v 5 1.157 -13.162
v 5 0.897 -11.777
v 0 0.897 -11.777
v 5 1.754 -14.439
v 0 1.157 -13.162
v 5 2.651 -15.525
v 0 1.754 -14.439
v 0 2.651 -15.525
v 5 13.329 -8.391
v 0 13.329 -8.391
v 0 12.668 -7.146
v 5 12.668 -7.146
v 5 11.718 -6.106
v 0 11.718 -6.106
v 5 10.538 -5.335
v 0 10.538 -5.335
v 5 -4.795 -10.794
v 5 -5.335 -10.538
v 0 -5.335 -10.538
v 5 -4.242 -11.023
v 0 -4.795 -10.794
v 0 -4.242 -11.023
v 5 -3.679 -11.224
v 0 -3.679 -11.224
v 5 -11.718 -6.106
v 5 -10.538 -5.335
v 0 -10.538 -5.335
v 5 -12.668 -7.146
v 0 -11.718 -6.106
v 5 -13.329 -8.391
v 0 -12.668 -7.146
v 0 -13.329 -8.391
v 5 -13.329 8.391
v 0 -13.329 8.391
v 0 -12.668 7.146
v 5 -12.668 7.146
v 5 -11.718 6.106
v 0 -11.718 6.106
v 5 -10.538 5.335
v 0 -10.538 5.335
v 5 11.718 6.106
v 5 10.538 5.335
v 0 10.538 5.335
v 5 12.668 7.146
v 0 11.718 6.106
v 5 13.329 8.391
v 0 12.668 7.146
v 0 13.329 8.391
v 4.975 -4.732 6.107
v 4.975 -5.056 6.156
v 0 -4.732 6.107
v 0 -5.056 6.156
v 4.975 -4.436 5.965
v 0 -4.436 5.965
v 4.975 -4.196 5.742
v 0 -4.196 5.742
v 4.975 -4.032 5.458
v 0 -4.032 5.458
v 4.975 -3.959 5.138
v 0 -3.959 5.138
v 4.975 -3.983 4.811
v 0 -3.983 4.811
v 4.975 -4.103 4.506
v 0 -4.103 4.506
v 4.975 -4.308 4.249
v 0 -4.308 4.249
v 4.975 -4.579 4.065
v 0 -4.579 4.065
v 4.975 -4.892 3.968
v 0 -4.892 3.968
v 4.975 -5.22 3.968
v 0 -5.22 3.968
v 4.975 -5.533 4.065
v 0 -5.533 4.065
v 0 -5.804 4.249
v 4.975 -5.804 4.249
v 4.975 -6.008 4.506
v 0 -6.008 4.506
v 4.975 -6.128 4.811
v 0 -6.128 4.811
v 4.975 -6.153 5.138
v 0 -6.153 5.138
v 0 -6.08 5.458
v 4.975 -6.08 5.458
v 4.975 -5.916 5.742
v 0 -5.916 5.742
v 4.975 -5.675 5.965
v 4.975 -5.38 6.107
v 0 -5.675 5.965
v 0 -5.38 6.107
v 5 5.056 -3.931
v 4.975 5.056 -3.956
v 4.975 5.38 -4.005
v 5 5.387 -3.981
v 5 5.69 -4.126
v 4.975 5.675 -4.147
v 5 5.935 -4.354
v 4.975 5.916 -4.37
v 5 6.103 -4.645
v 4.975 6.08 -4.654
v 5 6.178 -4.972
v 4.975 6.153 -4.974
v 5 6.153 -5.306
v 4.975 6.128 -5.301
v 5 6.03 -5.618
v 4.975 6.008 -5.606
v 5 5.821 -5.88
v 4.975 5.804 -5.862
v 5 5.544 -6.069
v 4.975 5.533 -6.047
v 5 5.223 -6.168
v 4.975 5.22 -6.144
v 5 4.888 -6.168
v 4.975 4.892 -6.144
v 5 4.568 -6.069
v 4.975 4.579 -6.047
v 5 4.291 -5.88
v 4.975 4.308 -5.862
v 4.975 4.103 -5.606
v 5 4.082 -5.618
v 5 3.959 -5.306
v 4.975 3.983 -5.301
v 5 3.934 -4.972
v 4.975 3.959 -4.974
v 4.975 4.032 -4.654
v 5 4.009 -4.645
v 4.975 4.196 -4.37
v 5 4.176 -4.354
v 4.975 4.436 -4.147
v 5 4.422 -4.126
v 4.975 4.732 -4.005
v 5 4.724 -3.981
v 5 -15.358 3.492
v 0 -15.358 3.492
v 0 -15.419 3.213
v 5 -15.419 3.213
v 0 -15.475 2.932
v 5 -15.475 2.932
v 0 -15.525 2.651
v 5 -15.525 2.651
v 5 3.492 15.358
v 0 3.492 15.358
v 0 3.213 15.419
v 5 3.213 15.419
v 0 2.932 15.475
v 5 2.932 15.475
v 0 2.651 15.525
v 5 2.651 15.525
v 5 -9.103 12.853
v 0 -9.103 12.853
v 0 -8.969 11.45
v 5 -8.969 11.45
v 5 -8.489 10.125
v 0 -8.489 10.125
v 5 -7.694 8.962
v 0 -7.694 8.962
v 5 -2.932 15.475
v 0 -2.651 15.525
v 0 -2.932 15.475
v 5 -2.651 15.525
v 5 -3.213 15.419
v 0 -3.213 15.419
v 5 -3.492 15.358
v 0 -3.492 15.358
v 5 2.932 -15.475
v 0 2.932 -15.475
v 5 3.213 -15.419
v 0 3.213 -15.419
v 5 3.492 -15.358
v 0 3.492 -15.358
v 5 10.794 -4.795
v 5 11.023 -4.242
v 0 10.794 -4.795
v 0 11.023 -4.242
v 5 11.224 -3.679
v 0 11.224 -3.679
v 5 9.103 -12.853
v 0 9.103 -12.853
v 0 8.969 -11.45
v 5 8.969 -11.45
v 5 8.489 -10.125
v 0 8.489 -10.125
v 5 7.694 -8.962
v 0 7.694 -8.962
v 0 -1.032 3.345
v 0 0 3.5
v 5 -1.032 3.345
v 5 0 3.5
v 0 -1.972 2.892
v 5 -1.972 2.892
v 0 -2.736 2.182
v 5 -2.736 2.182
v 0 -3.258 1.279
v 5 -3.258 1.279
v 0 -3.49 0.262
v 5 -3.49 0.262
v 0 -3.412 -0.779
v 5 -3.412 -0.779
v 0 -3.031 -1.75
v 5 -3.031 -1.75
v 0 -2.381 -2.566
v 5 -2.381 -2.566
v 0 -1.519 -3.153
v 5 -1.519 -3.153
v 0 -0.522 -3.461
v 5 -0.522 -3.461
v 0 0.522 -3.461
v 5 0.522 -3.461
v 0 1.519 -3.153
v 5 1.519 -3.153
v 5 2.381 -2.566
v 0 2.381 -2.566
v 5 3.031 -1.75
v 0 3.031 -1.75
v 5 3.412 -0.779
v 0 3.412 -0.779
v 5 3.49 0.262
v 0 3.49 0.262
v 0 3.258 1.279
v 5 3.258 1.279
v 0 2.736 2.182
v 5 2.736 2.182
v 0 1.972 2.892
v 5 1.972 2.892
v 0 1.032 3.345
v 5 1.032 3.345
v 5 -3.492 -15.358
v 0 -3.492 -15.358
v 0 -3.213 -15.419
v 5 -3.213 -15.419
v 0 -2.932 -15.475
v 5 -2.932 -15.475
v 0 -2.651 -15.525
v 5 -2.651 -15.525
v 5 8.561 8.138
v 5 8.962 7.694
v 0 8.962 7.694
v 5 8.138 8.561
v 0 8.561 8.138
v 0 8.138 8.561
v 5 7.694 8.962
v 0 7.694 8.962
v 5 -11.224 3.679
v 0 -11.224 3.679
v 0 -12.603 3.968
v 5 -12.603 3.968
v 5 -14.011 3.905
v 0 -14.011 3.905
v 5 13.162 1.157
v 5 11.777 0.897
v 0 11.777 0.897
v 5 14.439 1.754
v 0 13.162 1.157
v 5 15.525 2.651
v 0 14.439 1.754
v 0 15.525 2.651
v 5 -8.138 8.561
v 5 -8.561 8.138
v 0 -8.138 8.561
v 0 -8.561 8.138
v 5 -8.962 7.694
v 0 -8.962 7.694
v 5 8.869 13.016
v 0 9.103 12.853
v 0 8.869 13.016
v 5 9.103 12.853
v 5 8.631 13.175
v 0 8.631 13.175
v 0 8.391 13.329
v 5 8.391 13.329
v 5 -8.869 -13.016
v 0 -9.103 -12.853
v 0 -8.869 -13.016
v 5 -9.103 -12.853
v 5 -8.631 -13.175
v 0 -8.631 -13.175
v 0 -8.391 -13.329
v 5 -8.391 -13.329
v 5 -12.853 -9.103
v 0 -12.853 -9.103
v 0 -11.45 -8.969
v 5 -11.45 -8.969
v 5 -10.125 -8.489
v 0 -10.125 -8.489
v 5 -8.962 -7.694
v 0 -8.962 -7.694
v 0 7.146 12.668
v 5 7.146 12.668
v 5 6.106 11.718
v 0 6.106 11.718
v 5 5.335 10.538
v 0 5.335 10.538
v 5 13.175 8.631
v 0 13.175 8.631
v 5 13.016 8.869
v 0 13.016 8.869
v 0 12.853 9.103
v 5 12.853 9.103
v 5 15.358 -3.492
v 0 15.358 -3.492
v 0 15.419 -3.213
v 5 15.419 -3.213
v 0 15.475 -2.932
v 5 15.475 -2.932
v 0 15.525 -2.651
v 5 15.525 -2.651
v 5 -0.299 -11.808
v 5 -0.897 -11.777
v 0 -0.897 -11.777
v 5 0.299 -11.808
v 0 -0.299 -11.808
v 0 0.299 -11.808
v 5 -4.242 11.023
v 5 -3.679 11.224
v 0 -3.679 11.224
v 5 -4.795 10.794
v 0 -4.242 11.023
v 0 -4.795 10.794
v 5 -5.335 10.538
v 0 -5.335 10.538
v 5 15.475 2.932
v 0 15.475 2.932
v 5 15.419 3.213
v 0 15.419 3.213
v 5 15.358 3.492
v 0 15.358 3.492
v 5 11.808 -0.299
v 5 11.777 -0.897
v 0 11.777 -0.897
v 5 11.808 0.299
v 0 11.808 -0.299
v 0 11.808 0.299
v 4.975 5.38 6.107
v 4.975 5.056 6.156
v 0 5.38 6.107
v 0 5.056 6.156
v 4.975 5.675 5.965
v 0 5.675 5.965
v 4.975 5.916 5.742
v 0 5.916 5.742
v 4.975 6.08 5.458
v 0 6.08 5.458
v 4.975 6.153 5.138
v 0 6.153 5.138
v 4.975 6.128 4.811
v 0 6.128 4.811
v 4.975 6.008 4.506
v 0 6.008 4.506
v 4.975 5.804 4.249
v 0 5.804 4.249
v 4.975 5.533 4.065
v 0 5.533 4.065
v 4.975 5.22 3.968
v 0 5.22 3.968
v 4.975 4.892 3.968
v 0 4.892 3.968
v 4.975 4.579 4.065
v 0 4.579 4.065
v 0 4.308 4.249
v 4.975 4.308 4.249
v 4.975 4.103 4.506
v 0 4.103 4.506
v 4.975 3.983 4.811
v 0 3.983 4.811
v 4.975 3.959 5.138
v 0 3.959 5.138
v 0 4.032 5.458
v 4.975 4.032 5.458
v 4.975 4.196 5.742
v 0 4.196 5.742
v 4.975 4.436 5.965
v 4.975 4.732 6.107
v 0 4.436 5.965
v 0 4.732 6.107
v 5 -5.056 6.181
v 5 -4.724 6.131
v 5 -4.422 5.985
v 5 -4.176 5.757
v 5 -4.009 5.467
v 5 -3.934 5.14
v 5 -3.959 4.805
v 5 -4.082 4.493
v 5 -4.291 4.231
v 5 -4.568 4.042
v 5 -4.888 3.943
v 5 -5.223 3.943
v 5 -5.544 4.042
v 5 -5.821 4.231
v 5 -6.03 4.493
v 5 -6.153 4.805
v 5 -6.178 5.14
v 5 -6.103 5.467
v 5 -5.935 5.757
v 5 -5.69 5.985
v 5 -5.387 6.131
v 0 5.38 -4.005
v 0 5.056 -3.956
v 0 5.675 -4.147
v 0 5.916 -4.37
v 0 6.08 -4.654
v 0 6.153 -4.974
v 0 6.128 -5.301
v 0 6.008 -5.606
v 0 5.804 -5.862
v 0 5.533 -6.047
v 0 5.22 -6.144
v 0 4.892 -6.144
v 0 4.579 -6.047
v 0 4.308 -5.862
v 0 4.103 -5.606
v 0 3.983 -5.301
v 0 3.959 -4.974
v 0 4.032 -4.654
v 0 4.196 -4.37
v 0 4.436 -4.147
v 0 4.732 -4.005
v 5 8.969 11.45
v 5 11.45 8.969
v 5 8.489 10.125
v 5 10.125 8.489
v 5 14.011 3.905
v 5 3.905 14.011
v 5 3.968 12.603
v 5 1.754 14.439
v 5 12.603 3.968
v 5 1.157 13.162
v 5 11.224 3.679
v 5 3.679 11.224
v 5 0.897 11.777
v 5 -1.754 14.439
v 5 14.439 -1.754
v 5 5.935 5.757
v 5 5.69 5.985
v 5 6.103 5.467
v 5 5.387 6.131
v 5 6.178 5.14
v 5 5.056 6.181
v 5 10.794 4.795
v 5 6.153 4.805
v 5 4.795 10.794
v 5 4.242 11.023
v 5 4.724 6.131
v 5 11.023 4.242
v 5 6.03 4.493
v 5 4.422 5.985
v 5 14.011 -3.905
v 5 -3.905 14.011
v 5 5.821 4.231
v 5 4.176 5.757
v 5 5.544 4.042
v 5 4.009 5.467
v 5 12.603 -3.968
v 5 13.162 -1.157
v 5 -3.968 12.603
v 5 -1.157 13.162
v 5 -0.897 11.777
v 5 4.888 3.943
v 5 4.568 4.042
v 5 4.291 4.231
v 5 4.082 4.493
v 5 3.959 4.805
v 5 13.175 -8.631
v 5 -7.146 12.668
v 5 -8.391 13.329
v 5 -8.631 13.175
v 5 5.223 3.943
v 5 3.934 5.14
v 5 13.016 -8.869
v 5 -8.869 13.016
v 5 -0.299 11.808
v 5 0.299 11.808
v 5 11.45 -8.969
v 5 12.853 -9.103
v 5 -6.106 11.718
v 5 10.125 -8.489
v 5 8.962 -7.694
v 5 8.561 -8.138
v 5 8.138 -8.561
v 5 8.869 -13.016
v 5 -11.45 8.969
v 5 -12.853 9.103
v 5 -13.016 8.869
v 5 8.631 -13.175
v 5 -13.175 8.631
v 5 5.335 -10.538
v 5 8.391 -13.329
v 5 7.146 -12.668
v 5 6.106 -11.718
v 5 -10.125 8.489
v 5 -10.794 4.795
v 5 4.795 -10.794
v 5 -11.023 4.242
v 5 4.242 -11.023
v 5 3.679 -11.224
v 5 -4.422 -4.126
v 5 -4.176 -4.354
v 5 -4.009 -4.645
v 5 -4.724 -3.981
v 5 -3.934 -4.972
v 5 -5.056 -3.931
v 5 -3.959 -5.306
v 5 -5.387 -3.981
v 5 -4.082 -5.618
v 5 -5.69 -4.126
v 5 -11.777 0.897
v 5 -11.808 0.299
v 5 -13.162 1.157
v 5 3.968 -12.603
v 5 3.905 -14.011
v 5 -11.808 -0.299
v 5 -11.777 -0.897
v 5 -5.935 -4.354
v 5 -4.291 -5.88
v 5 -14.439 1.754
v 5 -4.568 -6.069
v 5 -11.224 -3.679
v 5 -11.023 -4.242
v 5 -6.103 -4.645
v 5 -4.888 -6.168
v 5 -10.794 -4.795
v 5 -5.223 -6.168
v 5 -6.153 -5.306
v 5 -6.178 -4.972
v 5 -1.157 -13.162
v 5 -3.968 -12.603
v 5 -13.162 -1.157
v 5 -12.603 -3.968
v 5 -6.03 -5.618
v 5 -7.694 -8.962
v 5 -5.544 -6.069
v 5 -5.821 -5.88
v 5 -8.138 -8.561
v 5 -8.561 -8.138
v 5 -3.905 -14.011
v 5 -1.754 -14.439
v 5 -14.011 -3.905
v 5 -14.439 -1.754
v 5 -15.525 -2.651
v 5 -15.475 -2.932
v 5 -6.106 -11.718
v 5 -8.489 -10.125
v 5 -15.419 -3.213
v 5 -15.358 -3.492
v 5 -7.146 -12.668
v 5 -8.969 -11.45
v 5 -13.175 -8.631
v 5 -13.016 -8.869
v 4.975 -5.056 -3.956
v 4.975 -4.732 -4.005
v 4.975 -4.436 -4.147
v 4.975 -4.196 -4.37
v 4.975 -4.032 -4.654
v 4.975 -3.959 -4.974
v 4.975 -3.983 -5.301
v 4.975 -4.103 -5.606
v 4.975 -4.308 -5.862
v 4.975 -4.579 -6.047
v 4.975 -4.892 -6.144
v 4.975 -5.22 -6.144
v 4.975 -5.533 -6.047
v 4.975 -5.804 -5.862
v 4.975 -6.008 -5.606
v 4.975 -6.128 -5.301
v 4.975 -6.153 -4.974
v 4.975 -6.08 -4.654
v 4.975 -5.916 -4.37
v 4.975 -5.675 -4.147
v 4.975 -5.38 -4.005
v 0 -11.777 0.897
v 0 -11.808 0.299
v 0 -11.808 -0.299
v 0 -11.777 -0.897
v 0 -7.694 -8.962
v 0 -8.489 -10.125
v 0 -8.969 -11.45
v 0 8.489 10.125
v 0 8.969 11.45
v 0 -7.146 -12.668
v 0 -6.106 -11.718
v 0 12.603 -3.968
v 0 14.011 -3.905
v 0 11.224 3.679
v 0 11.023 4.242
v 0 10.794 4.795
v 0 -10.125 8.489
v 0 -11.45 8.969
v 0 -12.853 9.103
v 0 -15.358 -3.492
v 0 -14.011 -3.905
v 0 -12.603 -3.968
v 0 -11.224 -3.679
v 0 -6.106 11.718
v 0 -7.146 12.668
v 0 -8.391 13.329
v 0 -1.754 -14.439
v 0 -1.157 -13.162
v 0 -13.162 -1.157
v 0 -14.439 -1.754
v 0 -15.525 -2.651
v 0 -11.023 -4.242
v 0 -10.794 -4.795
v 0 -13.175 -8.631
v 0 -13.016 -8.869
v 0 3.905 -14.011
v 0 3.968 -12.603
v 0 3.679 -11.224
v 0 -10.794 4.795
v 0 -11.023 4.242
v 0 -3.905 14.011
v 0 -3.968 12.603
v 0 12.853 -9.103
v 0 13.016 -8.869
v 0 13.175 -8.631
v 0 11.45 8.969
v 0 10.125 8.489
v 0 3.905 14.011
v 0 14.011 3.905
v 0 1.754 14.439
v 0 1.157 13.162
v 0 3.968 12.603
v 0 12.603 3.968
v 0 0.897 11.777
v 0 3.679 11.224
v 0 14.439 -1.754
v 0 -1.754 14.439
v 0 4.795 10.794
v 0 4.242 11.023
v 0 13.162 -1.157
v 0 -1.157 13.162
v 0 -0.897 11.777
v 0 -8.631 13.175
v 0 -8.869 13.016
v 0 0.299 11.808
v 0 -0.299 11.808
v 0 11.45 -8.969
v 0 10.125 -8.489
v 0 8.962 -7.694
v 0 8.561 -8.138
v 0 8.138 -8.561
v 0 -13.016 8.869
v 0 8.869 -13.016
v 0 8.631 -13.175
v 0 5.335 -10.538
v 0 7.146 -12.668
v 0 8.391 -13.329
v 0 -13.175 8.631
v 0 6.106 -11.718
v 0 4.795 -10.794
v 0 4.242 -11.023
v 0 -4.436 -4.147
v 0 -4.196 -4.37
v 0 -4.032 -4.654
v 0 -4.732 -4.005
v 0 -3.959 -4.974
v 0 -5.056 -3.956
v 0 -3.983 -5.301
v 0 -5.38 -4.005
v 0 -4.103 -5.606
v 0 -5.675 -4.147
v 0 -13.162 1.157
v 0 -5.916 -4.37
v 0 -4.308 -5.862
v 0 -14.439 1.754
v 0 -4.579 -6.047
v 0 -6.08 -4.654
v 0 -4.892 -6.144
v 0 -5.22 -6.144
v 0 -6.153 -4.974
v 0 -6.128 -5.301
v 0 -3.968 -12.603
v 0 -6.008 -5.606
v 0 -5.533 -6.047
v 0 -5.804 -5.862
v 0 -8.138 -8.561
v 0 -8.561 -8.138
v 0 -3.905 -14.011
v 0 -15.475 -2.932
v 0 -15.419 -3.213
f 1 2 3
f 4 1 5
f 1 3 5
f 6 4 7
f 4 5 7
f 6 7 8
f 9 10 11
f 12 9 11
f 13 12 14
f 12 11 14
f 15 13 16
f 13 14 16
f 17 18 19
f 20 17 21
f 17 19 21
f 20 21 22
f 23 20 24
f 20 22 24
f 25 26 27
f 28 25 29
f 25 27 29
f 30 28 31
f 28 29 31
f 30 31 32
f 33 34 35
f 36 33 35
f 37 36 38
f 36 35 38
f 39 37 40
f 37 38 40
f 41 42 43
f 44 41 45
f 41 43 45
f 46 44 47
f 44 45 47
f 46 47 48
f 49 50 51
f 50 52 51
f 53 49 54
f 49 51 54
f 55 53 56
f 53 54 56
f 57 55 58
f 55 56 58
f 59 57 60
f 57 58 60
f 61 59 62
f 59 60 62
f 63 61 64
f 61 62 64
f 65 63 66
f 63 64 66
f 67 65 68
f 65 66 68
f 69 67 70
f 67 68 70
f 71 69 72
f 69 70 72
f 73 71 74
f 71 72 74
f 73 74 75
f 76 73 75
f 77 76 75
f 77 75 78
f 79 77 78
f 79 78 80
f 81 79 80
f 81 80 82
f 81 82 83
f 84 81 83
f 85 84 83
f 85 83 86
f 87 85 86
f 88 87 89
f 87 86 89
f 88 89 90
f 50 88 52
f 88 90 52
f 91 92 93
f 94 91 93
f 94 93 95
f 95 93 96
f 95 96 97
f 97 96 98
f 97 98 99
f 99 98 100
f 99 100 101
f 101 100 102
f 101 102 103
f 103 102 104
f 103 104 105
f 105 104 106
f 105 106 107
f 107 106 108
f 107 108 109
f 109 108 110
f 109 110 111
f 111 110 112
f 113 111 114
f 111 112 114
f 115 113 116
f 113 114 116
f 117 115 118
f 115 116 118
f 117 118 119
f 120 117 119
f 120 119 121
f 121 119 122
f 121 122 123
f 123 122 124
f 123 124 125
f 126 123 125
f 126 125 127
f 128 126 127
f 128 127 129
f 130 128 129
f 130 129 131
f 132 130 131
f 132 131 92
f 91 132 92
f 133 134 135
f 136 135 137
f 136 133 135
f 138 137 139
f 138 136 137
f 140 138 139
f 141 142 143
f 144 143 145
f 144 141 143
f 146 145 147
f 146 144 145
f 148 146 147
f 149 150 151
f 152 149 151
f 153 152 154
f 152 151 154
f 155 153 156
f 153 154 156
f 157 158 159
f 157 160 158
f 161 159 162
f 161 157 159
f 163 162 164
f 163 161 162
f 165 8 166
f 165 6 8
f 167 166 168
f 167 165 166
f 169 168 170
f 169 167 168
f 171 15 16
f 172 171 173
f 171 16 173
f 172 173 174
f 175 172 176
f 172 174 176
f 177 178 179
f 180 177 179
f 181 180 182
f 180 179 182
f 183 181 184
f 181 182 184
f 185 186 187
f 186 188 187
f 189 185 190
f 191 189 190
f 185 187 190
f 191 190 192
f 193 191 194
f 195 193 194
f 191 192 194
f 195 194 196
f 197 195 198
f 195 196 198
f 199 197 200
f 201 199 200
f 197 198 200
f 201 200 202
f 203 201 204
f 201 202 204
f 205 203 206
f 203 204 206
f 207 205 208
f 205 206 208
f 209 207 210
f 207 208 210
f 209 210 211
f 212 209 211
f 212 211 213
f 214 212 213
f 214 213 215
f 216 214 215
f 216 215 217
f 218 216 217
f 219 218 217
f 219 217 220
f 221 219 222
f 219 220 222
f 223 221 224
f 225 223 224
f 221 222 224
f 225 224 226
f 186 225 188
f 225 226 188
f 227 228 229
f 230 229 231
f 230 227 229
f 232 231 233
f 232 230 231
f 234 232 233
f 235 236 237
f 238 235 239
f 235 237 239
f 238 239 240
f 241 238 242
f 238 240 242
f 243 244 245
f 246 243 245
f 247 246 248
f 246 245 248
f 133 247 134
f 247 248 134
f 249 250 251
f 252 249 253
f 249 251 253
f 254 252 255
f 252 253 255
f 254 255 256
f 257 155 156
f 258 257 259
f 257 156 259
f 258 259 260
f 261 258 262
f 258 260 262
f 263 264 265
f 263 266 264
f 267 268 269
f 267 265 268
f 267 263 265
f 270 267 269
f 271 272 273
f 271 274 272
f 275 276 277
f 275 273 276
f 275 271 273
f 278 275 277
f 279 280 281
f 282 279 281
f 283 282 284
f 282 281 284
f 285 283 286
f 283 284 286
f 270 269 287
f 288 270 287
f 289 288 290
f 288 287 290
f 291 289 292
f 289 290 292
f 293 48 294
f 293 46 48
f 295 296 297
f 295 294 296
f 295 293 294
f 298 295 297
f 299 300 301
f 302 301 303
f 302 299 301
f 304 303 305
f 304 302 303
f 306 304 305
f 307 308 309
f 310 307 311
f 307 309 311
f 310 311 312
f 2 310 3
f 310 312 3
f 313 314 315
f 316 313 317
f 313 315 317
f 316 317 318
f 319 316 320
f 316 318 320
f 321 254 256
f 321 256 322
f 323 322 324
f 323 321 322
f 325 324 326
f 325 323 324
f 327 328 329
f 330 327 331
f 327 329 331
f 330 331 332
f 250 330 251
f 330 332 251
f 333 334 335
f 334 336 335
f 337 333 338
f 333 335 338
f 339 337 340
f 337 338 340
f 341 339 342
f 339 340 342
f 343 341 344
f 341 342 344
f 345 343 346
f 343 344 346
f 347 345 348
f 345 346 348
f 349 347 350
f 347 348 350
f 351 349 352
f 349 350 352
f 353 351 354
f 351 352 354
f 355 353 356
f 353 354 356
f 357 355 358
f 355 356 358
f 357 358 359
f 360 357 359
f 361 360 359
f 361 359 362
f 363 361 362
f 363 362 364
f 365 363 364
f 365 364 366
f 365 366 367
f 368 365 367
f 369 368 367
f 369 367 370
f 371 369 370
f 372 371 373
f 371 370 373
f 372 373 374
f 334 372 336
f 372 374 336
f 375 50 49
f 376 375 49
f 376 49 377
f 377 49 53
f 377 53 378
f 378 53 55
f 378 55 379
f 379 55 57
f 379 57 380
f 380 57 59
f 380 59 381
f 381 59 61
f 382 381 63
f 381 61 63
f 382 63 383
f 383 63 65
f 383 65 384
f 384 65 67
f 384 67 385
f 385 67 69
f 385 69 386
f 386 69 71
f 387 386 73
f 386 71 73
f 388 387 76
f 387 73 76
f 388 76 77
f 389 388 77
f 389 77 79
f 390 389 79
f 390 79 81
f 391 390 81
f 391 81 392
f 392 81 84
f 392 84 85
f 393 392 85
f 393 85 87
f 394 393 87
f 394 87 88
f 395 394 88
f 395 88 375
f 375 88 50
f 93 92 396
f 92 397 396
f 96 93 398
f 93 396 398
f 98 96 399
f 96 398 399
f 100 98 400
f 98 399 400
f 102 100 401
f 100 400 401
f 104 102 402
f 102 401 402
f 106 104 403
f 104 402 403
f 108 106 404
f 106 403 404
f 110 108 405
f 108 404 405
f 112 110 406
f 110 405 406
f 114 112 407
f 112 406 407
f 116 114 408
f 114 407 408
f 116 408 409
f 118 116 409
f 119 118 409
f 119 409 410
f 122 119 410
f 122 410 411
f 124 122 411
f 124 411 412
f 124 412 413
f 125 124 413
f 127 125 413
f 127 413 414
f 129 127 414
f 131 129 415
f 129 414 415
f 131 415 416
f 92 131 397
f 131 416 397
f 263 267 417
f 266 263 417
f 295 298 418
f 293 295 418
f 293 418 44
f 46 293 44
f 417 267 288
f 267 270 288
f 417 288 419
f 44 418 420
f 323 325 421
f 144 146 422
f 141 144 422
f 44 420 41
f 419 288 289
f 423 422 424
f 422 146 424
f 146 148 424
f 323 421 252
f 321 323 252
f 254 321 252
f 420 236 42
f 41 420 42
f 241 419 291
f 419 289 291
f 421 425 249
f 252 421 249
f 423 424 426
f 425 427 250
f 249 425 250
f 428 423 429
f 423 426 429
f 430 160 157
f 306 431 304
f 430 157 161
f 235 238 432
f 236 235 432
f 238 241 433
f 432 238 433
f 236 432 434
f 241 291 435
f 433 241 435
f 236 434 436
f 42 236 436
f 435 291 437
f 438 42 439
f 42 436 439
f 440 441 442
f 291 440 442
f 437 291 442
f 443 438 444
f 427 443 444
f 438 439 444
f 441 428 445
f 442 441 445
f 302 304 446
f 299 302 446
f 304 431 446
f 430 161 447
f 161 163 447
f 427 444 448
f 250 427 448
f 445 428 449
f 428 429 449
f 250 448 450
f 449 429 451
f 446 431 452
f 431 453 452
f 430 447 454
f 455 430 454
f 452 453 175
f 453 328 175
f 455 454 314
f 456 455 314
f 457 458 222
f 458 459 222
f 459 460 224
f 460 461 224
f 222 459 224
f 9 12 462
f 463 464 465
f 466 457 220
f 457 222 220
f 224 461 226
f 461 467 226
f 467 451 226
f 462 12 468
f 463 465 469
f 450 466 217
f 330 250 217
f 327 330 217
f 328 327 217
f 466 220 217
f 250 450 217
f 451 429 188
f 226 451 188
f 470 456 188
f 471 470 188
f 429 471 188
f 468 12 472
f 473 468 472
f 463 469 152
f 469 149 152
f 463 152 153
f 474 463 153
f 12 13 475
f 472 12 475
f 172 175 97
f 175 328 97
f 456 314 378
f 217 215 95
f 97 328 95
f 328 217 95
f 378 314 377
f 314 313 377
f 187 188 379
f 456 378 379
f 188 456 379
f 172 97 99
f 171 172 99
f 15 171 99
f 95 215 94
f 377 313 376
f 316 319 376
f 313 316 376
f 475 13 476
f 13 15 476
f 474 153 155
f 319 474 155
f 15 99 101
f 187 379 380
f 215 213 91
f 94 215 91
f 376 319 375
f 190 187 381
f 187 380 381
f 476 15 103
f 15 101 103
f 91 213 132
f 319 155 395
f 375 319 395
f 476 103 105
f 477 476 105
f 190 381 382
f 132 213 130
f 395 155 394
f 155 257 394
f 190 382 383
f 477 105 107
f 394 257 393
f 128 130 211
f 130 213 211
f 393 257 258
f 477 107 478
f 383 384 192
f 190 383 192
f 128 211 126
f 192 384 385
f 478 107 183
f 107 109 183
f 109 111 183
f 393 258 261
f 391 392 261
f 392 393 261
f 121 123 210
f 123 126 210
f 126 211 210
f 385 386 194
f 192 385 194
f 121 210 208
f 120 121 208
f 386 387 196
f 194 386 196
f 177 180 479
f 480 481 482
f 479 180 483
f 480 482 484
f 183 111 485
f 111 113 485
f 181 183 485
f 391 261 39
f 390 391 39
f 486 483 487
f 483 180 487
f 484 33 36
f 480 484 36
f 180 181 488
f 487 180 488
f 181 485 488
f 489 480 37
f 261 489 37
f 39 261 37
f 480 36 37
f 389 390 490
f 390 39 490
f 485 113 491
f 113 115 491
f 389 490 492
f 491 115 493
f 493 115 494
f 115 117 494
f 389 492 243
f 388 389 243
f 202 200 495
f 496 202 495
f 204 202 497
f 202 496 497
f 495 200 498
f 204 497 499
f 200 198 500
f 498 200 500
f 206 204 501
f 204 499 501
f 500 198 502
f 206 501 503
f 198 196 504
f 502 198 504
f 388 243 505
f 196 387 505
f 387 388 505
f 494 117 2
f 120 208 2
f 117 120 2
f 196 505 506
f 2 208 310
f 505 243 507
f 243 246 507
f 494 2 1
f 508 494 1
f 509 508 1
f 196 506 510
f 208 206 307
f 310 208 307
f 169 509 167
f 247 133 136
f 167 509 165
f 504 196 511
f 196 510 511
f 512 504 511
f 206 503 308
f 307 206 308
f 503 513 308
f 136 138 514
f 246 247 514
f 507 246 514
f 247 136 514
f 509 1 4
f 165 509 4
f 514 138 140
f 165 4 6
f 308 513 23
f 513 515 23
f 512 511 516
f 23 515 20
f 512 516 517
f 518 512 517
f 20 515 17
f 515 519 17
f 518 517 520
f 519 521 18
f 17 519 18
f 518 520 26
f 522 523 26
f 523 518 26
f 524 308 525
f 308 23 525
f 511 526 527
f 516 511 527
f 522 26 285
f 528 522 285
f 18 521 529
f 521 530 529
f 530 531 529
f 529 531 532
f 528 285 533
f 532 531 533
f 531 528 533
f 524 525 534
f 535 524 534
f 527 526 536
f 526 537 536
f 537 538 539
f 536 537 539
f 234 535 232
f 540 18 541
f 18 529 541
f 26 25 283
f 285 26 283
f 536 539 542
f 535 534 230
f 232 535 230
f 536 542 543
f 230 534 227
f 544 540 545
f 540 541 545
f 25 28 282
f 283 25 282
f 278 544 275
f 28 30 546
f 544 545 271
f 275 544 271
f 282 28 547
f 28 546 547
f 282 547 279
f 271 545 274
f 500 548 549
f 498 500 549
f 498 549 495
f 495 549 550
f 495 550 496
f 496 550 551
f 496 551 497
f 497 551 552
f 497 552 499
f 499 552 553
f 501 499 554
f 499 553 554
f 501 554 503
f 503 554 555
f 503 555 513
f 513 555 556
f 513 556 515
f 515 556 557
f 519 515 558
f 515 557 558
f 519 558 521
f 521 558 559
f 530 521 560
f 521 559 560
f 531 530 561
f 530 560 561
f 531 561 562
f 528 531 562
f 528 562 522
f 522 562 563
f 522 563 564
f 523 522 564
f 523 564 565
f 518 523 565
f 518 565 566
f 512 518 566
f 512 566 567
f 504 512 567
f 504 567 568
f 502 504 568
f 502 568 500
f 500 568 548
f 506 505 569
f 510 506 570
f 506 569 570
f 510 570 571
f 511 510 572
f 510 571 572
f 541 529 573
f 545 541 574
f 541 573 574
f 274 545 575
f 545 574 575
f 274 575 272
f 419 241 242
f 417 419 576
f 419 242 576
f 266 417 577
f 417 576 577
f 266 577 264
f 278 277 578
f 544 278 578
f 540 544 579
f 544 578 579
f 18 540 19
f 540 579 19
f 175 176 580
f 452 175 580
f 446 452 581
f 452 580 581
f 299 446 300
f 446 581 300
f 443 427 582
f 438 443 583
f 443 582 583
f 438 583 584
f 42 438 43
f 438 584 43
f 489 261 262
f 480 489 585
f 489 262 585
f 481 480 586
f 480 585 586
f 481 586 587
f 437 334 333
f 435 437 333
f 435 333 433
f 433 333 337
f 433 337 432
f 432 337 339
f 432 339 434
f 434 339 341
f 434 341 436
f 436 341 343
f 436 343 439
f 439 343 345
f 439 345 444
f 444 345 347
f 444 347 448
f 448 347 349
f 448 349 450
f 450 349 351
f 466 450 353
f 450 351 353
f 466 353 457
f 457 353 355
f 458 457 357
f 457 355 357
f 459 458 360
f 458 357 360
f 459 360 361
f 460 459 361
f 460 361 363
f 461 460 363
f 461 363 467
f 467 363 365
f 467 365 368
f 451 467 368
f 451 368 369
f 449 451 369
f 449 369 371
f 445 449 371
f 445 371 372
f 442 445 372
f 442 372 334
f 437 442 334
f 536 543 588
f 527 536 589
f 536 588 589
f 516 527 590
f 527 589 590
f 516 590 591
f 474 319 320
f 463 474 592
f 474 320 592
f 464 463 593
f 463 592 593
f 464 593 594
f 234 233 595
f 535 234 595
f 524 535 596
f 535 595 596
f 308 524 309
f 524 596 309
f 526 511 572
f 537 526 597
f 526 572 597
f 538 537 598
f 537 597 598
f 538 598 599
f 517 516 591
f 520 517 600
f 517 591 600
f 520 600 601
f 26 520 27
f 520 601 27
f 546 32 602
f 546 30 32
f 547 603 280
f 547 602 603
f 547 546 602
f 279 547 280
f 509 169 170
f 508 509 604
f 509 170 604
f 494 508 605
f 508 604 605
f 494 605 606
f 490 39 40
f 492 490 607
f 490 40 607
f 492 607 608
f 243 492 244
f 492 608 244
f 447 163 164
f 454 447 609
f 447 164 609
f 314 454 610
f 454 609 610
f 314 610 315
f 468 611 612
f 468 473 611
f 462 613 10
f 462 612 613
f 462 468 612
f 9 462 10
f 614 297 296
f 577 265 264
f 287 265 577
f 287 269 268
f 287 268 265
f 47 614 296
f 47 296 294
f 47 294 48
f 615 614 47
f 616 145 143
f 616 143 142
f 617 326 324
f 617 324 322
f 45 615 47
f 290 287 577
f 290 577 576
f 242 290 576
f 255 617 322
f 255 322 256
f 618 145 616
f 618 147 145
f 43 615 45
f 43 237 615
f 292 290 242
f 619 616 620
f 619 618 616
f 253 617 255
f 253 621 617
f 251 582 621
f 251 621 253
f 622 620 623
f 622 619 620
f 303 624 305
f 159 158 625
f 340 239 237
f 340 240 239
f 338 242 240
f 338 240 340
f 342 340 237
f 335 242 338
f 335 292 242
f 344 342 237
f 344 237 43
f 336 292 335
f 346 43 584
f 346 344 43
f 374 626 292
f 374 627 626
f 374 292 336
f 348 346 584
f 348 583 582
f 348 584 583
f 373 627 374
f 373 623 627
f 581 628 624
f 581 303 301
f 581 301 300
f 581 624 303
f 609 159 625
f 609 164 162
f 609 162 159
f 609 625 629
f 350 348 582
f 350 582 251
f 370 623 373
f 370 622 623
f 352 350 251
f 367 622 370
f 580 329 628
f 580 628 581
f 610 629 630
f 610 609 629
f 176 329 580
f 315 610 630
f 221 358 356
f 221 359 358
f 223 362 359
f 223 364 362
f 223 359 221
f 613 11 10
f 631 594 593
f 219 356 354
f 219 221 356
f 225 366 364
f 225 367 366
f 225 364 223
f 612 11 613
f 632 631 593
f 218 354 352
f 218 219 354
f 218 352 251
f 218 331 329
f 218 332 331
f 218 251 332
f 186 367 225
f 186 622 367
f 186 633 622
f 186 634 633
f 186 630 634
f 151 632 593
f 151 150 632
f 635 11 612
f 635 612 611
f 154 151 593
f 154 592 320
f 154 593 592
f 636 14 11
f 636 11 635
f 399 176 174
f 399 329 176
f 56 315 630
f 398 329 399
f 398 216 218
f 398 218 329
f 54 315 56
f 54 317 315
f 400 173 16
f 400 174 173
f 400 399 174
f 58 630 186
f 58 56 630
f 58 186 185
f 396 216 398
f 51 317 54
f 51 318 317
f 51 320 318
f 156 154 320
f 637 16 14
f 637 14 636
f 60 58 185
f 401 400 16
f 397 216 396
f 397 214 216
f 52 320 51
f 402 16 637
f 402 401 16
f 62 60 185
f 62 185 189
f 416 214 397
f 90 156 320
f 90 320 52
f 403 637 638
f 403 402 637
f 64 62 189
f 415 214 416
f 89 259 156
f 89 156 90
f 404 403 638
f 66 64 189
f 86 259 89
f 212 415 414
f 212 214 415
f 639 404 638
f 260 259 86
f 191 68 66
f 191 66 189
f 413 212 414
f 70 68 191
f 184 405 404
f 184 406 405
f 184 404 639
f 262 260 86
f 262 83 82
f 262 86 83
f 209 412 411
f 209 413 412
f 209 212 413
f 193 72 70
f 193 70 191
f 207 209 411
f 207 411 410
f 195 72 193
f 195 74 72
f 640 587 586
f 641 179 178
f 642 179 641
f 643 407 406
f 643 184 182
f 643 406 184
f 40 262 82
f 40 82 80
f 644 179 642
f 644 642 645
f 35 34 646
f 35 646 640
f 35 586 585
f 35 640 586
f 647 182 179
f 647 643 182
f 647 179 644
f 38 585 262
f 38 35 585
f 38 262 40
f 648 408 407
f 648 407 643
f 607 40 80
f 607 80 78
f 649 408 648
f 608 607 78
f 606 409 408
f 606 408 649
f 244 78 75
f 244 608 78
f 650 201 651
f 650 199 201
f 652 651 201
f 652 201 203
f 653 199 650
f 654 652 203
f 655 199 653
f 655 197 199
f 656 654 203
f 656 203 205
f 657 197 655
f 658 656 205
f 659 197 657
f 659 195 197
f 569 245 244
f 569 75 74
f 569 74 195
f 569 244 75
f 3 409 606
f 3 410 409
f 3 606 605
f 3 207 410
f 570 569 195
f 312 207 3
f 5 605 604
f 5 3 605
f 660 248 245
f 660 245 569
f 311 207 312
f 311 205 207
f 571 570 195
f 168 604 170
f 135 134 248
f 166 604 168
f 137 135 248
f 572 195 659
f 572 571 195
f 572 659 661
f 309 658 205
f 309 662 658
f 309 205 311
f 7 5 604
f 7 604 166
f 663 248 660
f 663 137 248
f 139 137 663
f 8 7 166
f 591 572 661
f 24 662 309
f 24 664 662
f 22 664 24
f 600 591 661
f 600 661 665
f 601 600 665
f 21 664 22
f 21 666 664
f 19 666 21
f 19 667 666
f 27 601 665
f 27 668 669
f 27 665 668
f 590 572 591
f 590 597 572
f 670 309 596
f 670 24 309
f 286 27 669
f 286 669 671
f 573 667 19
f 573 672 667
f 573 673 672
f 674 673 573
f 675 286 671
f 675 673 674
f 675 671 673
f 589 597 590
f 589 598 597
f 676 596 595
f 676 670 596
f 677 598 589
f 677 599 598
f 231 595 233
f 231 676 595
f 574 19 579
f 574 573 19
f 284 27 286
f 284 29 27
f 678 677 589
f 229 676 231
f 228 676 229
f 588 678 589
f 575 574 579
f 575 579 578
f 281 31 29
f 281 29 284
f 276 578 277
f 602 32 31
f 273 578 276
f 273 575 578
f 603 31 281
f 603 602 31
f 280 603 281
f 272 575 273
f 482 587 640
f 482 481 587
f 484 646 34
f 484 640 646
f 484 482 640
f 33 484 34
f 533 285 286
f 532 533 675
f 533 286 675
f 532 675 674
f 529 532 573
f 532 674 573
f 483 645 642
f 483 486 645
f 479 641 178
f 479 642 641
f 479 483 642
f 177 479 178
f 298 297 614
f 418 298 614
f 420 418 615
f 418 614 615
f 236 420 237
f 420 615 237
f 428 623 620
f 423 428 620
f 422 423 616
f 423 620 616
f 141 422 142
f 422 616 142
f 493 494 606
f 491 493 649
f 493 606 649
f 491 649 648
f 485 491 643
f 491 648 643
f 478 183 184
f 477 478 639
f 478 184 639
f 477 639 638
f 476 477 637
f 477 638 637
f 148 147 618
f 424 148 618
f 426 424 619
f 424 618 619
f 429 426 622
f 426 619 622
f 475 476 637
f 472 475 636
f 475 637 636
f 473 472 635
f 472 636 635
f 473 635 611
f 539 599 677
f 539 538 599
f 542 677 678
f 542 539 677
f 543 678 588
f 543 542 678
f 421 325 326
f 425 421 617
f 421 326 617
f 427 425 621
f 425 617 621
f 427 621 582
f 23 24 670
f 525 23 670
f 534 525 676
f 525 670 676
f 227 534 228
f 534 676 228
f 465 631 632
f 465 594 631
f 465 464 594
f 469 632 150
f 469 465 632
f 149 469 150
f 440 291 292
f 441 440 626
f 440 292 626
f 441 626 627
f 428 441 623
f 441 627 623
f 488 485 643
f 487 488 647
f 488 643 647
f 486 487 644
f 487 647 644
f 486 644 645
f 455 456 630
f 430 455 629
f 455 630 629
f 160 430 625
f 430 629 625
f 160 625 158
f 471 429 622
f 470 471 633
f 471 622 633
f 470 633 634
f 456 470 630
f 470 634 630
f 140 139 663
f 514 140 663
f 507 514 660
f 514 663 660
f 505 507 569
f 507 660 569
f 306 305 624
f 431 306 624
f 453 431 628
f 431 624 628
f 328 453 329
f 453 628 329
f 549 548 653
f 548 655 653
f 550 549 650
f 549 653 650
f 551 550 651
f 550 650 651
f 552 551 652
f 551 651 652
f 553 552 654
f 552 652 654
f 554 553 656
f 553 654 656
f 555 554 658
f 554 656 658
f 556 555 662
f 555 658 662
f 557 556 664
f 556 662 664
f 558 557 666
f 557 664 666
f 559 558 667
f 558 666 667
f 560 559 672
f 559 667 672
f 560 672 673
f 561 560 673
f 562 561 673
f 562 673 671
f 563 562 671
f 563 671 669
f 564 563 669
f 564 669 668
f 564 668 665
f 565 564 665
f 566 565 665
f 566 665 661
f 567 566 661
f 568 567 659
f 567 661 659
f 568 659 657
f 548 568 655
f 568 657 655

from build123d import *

# Parameters (mm, degrees)
BASPROSKE_W                    = 5
BASPROSKE_H                    = 15.75
TOOTHCUT_DEPTH                 = 23.828162432
TEETHCUTS_COUNT                = 16
TEETHCUTS_ANGLE                = 337.5
BORSKE_R                       = 3.5
BORE_DEPTH                     = 50.0000508
M2_CLEARANCE_HOLE1_D           = 2.2
M2_CLEARANCE_HOLE1_CSINK_D     = 2.25
M2_CLEARANCE_HOLE1_CSINK_ANGLE = 90


with BuildPart() as part:
    # BasProSke → Base-Revolve (revolve)
    with BuildSketch(Plane(origin=(0, 0, 0), x_dir=(1, 0, 0), z_dir=(0, 1, 0)), mode=Mode.PRIVATE) as base_revolve_sk:
        with Locations((2.5, 7.875)):
            Rectangle(BASPROSKE_W, BASPROSKE_H)
    revolve(base_revolve_sk.sketch.rotate(Axis((-10, 0, 0), (1, 0, 0)), 180), axis=Axis((-10, 0, 0), (1, 0, 0)))

    # TooCutSke → ToothCut (cut, through all)
    with BuildSketch(Plane(origin=(0, 0, 0), x_dir=(0, 0, -1), z_dir=(1, 0, 0))):
        with BuildLine():
            ThreePointArc((0.896728289, 11.777411032), (0, 11.8115), (-0.896728289, 11.777411032))
            ThreePointArc((-0.896728289, 11.777411032), (-1.421809307, 13.833768969), (-2.674397607, 15.547052537))
            ThreePointArc((-2.674397607, 15.547052537), (0, 15.7754), (2.674397607, 15.547052537))
            ThreePointArc((2.674397607, 15.547052537), (1.421809307, 13.833768969), (0.896728289, 11.777411032))
        make_face()
    toothcut = extrude(amount=TOOTHCUT_DEPTH, mode=Mode.SUBTRACT)

    # TeethCuts: ToothCut ×16 about axis
    teethcuts_axis = Axis((-10, 0, 0), (1, 0, 0))
    for i in range(1, TEETHCUTS_COUNT):
        add(toothcut.rotate(teethcuts_axis, i * TEETHCUTS_ANGLE / (TEETHCUTS_COUNT - 1)), mode=Mode.SUBTRACT)

    # BorSke → Bore (cut, symmetric)
    with BuildSketch(Plane(origin=(0, 0, 0), x_dir=(0, 0, -1), z_dir=(1, 0, 0))):
        with Locations(Location((0, 0, 0), (0, 0, 180))):
            Circle(BORSKE_R)
    extrude(amount=BORE_DEPTH, both=True, mode=Mode.SUBTRACT)

    # M2 Clearance Hole1 (through all)
    with Locations(Plane(origin=(5, 0, 0), x_dir=(0, 0, -1), z_dir=(1, 0, 0))):
        with Locations((-5.055813485, 5.055813485), (5.055813485, 5.055813485), (5.055813485, -5.055813485), (-5.055813485, -5.055813485)):
            CounterSinkHole(M2_CLEARANCE_HOLE1_D / 2, M2_CLEARANCE_HOLE1_CSINK_D / 2, counter_sink_angle=M2_CLEARANCE_HOLE1_CSINK_ANGLE)


solid = part.part
